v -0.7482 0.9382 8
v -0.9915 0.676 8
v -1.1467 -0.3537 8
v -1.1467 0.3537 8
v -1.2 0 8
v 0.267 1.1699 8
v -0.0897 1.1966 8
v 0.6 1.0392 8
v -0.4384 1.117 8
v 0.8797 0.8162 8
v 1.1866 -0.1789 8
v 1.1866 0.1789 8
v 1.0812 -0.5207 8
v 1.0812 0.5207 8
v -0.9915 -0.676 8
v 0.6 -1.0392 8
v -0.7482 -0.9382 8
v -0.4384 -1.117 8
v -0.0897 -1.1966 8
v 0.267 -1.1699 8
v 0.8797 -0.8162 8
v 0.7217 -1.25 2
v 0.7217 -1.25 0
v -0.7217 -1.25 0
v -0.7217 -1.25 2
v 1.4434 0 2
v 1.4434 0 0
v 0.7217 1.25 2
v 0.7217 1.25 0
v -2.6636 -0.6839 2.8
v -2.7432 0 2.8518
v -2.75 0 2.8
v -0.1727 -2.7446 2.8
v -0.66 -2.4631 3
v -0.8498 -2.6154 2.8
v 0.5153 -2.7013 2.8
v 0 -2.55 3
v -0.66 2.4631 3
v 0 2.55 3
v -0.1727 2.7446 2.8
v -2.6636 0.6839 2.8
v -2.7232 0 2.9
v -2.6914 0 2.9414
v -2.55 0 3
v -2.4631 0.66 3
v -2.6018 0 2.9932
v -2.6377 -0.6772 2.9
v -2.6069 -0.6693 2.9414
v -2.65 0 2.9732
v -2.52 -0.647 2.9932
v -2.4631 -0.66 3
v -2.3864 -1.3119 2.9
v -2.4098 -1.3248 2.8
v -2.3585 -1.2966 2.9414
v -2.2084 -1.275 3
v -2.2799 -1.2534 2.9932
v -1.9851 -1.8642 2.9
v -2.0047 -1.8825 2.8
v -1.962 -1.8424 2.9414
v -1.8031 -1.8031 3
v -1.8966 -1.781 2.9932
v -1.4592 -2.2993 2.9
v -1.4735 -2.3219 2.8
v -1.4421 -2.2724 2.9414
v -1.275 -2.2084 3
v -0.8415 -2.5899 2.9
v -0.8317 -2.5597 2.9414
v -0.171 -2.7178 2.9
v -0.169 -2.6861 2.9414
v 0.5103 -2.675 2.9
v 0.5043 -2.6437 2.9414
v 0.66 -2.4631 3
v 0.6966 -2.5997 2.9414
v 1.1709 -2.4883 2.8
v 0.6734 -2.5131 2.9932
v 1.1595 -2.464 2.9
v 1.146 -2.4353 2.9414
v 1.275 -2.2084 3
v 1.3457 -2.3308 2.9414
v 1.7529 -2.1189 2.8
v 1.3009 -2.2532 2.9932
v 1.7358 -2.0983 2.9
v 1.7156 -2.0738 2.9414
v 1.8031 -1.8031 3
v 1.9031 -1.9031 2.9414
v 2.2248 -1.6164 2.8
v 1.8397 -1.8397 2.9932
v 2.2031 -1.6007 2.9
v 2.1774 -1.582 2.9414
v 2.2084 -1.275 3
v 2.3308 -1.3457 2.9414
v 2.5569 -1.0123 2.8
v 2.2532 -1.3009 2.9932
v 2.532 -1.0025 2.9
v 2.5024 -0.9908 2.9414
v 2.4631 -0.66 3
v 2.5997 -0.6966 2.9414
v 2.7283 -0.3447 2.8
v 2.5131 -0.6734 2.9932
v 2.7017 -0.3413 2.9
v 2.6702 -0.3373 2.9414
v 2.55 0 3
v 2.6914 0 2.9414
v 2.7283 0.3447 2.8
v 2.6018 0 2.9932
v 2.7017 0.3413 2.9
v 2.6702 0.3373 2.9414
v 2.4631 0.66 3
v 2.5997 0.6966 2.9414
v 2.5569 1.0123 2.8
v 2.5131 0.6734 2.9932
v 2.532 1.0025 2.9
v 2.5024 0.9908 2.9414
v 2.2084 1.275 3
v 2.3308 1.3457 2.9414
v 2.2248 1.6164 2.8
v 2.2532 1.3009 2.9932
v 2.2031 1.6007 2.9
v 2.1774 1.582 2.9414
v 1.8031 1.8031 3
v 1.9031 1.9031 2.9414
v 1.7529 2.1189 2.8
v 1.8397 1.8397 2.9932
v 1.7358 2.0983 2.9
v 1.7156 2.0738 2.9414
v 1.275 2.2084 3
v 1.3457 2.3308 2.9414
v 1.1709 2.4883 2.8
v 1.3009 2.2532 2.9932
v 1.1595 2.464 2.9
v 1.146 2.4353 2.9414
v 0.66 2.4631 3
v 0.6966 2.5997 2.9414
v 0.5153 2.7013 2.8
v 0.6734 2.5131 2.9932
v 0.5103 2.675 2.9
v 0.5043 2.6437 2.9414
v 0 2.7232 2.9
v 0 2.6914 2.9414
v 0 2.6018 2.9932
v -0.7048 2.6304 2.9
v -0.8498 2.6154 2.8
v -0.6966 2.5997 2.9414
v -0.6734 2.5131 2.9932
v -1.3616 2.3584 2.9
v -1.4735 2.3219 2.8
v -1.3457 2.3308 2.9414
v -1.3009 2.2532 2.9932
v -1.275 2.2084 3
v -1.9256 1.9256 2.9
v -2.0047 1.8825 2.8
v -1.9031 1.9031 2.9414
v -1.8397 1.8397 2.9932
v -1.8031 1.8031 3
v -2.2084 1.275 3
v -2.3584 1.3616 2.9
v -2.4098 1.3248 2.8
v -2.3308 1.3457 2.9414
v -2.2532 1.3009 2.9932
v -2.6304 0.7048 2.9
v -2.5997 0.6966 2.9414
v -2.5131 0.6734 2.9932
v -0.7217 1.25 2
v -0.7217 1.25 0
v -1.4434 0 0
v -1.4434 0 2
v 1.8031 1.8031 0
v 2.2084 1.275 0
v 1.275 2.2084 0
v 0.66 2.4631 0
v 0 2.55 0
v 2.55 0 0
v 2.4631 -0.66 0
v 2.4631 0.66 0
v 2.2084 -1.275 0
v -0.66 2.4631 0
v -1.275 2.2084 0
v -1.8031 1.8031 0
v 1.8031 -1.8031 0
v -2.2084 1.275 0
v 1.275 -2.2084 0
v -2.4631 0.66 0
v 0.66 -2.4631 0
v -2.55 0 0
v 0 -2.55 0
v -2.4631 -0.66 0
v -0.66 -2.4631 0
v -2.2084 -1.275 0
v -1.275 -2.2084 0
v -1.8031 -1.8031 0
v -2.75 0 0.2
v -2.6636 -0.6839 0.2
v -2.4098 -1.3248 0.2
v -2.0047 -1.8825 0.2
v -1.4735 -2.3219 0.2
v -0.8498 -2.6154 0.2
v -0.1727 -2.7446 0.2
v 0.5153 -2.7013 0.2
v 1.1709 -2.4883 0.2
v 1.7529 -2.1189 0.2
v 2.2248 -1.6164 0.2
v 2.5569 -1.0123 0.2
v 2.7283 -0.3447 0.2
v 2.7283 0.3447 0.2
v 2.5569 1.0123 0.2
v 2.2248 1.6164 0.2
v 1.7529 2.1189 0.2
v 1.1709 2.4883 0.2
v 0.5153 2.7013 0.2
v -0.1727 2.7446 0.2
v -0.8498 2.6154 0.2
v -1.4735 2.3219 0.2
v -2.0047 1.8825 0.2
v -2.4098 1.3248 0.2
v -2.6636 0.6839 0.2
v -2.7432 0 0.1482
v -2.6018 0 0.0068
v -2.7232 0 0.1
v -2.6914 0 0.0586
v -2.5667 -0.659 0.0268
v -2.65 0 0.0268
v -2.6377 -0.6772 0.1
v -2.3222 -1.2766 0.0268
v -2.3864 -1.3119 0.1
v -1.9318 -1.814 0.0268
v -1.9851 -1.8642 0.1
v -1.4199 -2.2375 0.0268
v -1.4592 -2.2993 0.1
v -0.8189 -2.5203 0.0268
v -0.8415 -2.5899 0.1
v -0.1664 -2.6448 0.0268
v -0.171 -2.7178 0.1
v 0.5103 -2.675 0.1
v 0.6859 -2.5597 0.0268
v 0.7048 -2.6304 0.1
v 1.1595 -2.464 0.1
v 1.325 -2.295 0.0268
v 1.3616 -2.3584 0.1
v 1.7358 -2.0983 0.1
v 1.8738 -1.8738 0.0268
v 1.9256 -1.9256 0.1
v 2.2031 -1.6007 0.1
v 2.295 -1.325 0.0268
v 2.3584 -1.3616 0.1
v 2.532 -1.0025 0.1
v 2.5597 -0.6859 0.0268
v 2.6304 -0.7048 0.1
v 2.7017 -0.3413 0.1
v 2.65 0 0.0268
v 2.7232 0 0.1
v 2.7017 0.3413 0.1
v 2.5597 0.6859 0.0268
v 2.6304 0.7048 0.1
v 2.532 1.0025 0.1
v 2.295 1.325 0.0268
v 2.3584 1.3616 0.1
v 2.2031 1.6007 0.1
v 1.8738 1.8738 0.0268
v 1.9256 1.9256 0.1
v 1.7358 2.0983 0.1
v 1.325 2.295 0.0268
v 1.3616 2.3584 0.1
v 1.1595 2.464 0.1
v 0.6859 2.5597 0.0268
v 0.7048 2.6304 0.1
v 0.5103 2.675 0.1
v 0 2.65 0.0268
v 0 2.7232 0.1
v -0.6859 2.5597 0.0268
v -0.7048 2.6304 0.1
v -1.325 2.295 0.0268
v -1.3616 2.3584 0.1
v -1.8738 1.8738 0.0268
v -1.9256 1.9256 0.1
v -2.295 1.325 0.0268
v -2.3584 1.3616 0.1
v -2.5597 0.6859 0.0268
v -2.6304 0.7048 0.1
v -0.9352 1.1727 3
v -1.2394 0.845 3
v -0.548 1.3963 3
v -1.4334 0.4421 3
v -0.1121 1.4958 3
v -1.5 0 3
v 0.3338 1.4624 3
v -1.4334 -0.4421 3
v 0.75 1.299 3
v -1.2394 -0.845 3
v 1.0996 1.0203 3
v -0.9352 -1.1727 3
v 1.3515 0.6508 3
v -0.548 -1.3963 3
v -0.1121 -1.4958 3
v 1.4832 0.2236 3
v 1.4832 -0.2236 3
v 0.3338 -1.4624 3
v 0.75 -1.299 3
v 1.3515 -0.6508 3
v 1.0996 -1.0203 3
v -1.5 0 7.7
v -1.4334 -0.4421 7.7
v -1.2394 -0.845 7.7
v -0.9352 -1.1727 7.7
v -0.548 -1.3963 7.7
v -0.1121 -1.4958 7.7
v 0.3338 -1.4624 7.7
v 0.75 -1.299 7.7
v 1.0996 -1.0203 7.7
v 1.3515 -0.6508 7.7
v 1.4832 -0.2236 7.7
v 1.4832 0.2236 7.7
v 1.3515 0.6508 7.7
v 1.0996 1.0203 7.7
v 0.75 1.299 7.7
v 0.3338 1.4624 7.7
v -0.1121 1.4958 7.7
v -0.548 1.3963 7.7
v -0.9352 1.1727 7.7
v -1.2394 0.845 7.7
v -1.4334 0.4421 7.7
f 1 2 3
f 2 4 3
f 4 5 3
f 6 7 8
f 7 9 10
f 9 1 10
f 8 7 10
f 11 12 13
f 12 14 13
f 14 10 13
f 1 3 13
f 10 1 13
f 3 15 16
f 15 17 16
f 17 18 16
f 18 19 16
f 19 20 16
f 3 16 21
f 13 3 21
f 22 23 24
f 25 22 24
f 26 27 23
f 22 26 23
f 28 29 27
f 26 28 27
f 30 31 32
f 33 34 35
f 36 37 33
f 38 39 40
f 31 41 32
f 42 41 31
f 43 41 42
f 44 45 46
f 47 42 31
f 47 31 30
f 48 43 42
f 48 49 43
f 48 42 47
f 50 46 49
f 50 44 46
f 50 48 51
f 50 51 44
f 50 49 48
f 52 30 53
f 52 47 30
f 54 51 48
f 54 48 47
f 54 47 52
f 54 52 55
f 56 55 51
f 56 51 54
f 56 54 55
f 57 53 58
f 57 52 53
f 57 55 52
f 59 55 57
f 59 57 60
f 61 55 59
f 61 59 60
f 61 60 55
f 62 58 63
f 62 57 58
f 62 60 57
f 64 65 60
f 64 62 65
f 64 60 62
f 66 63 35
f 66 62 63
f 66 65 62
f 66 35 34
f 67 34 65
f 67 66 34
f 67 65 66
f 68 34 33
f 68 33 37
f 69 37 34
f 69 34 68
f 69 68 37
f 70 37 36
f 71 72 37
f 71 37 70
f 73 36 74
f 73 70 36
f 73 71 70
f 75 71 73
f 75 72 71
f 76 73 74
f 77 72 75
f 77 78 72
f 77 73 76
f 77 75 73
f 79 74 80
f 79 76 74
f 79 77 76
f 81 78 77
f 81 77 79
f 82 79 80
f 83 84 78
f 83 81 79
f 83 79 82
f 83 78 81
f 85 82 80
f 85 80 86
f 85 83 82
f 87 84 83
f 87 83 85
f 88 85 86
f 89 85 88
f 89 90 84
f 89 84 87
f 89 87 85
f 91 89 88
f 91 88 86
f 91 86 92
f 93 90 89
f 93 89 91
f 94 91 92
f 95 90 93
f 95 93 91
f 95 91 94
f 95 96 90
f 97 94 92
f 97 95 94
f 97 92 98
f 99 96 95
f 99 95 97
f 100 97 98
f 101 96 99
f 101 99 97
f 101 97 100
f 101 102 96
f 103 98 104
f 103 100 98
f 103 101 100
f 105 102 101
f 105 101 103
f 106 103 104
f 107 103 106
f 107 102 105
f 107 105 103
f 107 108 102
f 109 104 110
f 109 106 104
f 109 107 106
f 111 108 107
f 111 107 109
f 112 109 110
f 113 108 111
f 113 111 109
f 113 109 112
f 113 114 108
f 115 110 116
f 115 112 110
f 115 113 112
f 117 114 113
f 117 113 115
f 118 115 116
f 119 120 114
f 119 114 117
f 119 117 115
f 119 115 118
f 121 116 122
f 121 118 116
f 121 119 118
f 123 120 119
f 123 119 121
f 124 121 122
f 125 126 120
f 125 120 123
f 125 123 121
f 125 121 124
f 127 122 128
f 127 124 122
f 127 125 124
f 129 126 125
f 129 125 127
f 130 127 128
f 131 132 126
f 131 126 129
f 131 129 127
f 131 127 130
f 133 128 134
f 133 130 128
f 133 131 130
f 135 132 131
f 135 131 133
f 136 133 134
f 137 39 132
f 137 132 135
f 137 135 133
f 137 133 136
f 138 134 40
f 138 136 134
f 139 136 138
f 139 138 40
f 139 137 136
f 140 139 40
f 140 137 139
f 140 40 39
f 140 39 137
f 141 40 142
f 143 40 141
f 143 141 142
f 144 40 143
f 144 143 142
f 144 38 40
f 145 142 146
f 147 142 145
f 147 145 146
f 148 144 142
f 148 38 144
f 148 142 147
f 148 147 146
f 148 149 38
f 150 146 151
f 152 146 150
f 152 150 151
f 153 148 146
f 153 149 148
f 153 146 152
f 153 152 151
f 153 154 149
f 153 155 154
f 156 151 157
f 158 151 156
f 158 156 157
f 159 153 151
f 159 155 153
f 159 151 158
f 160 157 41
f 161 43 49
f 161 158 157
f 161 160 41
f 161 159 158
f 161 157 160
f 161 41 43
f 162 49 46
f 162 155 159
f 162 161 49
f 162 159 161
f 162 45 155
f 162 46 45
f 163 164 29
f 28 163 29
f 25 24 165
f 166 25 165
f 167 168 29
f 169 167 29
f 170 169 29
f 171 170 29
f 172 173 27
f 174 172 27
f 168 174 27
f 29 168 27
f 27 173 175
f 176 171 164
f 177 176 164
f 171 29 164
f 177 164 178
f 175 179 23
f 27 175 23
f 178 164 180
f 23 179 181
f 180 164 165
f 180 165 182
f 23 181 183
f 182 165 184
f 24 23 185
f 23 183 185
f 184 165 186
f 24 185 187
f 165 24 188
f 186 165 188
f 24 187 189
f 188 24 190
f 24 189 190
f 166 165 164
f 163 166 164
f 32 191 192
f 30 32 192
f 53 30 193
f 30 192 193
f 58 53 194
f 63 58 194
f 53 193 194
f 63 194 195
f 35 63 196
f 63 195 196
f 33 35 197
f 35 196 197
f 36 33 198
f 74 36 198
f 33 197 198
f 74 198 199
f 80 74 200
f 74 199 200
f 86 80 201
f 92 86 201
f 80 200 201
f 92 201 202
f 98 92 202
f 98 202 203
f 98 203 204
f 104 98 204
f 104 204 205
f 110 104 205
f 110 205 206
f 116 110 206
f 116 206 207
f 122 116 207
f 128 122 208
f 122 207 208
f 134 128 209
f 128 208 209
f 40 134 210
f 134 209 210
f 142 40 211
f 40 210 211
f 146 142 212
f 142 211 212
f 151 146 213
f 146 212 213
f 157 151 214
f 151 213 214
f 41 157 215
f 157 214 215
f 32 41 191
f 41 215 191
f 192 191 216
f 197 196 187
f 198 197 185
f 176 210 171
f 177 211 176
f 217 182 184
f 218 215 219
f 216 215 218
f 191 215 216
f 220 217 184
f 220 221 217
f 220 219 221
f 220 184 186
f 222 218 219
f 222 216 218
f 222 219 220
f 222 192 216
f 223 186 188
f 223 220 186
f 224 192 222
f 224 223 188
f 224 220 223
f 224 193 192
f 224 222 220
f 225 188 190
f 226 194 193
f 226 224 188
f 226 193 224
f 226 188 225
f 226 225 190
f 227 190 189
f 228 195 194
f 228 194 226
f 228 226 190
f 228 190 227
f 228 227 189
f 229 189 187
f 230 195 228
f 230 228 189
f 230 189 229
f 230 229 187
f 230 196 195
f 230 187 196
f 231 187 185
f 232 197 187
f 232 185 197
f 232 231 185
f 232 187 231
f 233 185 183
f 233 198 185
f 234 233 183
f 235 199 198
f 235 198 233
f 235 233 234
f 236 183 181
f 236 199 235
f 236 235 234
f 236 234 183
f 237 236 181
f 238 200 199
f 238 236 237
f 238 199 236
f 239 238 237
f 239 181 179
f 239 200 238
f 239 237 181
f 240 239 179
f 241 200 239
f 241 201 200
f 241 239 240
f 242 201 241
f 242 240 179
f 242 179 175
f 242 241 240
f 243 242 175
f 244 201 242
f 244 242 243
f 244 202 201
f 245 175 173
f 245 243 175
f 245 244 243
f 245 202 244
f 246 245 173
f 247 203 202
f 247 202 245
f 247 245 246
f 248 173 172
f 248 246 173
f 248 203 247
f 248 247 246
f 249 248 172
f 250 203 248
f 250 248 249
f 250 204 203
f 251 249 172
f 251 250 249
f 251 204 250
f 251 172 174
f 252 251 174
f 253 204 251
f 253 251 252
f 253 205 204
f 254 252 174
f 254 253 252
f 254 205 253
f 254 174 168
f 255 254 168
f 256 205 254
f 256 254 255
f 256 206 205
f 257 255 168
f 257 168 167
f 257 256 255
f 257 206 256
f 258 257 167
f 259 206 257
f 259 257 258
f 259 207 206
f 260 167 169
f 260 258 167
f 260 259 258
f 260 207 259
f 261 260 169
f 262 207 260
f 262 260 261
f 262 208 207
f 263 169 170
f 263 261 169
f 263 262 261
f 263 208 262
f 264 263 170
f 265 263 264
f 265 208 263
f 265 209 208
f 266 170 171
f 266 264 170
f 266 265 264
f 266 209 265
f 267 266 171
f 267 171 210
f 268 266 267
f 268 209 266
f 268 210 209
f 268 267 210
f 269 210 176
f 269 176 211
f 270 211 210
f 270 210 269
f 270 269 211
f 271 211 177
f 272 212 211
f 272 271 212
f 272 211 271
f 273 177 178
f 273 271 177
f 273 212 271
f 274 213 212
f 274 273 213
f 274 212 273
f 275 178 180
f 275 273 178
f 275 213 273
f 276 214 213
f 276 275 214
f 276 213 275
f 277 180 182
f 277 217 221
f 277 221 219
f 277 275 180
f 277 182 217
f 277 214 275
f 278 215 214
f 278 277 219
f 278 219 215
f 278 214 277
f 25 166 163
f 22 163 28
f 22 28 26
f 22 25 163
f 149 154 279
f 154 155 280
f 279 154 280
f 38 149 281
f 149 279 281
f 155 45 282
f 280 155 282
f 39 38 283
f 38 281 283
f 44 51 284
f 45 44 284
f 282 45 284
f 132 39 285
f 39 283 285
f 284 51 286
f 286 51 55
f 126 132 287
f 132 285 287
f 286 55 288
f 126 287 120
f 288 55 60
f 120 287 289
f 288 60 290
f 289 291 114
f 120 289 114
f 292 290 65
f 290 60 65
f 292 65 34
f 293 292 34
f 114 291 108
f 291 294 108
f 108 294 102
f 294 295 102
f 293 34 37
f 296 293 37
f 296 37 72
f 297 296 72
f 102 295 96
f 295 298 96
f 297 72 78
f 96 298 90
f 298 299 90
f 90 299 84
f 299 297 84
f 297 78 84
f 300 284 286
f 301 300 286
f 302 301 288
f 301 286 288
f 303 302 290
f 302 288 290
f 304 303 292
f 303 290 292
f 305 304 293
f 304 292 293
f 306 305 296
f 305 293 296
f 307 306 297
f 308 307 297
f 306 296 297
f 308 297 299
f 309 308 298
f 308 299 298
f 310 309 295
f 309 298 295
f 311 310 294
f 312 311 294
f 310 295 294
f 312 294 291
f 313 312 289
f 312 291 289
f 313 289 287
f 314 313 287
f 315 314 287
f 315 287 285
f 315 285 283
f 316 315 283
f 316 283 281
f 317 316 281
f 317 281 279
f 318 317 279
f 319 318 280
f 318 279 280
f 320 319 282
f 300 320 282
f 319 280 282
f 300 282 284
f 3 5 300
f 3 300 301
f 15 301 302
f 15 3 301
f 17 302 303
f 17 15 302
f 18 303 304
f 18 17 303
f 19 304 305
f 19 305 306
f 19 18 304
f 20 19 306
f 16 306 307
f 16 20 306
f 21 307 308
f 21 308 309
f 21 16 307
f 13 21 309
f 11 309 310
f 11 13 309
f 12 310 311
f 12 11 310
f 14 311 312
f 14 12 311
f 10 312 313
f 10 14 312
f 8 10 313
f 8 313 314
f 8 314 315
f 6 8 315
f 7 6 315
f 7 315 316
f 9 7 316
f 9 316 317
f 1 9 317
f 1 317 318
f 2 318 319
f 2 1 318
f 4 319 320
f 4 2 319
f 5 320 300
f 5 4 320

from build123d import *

# Parameters (mm, degrees)
F3_DEPTH = 2
F4_R     = 0.2
F5_SIZE  = 0.3


with BuildPart() as f1:
    # F0 (on Front) → F1 (revolve)
    with BuildSketch(Plane.XZ):
        Polygon((-2.75, 0), (0, 0), (0, 8), (-1.5, 8), (-1.5, 3), (-2.75, 3), align=None)
    revolve(axis=Axis((0, 0, 4), (0, 0, 1)))

    # F2 (on face) → F3 (cut)
    with BuildSketch(Plane(origin=(0, 0, 0), x_dir=(1, 0, 0), z_dir=(0, 0, -1))):
        Polygon((0.721688, 1.25), (-0.721688, 1.25), (-1.443376, 0), (-0.721688, -1.25), (0.721688, -1.25), (1.443376, 0), align=None)
    extrude(amount=-F3_DEPTH, mode=Mode.SUBTRACT)

    # F4
    f4_edges = [f1.edges().sort_by_distance(p)[0] for p in [
        (2.75, 0, 0),
        (2.75, 0, 3),
    ]]
    fillet(f4_edges, radius=F4_R)

    # F5
    f5_edges = [f1.edges().sort_by_distance(p)[0] for p in [
        (1.5, 0, 8),
    ]]
    chamfer(f5_edges, length=F5_SIZE)


solid = f1.part
